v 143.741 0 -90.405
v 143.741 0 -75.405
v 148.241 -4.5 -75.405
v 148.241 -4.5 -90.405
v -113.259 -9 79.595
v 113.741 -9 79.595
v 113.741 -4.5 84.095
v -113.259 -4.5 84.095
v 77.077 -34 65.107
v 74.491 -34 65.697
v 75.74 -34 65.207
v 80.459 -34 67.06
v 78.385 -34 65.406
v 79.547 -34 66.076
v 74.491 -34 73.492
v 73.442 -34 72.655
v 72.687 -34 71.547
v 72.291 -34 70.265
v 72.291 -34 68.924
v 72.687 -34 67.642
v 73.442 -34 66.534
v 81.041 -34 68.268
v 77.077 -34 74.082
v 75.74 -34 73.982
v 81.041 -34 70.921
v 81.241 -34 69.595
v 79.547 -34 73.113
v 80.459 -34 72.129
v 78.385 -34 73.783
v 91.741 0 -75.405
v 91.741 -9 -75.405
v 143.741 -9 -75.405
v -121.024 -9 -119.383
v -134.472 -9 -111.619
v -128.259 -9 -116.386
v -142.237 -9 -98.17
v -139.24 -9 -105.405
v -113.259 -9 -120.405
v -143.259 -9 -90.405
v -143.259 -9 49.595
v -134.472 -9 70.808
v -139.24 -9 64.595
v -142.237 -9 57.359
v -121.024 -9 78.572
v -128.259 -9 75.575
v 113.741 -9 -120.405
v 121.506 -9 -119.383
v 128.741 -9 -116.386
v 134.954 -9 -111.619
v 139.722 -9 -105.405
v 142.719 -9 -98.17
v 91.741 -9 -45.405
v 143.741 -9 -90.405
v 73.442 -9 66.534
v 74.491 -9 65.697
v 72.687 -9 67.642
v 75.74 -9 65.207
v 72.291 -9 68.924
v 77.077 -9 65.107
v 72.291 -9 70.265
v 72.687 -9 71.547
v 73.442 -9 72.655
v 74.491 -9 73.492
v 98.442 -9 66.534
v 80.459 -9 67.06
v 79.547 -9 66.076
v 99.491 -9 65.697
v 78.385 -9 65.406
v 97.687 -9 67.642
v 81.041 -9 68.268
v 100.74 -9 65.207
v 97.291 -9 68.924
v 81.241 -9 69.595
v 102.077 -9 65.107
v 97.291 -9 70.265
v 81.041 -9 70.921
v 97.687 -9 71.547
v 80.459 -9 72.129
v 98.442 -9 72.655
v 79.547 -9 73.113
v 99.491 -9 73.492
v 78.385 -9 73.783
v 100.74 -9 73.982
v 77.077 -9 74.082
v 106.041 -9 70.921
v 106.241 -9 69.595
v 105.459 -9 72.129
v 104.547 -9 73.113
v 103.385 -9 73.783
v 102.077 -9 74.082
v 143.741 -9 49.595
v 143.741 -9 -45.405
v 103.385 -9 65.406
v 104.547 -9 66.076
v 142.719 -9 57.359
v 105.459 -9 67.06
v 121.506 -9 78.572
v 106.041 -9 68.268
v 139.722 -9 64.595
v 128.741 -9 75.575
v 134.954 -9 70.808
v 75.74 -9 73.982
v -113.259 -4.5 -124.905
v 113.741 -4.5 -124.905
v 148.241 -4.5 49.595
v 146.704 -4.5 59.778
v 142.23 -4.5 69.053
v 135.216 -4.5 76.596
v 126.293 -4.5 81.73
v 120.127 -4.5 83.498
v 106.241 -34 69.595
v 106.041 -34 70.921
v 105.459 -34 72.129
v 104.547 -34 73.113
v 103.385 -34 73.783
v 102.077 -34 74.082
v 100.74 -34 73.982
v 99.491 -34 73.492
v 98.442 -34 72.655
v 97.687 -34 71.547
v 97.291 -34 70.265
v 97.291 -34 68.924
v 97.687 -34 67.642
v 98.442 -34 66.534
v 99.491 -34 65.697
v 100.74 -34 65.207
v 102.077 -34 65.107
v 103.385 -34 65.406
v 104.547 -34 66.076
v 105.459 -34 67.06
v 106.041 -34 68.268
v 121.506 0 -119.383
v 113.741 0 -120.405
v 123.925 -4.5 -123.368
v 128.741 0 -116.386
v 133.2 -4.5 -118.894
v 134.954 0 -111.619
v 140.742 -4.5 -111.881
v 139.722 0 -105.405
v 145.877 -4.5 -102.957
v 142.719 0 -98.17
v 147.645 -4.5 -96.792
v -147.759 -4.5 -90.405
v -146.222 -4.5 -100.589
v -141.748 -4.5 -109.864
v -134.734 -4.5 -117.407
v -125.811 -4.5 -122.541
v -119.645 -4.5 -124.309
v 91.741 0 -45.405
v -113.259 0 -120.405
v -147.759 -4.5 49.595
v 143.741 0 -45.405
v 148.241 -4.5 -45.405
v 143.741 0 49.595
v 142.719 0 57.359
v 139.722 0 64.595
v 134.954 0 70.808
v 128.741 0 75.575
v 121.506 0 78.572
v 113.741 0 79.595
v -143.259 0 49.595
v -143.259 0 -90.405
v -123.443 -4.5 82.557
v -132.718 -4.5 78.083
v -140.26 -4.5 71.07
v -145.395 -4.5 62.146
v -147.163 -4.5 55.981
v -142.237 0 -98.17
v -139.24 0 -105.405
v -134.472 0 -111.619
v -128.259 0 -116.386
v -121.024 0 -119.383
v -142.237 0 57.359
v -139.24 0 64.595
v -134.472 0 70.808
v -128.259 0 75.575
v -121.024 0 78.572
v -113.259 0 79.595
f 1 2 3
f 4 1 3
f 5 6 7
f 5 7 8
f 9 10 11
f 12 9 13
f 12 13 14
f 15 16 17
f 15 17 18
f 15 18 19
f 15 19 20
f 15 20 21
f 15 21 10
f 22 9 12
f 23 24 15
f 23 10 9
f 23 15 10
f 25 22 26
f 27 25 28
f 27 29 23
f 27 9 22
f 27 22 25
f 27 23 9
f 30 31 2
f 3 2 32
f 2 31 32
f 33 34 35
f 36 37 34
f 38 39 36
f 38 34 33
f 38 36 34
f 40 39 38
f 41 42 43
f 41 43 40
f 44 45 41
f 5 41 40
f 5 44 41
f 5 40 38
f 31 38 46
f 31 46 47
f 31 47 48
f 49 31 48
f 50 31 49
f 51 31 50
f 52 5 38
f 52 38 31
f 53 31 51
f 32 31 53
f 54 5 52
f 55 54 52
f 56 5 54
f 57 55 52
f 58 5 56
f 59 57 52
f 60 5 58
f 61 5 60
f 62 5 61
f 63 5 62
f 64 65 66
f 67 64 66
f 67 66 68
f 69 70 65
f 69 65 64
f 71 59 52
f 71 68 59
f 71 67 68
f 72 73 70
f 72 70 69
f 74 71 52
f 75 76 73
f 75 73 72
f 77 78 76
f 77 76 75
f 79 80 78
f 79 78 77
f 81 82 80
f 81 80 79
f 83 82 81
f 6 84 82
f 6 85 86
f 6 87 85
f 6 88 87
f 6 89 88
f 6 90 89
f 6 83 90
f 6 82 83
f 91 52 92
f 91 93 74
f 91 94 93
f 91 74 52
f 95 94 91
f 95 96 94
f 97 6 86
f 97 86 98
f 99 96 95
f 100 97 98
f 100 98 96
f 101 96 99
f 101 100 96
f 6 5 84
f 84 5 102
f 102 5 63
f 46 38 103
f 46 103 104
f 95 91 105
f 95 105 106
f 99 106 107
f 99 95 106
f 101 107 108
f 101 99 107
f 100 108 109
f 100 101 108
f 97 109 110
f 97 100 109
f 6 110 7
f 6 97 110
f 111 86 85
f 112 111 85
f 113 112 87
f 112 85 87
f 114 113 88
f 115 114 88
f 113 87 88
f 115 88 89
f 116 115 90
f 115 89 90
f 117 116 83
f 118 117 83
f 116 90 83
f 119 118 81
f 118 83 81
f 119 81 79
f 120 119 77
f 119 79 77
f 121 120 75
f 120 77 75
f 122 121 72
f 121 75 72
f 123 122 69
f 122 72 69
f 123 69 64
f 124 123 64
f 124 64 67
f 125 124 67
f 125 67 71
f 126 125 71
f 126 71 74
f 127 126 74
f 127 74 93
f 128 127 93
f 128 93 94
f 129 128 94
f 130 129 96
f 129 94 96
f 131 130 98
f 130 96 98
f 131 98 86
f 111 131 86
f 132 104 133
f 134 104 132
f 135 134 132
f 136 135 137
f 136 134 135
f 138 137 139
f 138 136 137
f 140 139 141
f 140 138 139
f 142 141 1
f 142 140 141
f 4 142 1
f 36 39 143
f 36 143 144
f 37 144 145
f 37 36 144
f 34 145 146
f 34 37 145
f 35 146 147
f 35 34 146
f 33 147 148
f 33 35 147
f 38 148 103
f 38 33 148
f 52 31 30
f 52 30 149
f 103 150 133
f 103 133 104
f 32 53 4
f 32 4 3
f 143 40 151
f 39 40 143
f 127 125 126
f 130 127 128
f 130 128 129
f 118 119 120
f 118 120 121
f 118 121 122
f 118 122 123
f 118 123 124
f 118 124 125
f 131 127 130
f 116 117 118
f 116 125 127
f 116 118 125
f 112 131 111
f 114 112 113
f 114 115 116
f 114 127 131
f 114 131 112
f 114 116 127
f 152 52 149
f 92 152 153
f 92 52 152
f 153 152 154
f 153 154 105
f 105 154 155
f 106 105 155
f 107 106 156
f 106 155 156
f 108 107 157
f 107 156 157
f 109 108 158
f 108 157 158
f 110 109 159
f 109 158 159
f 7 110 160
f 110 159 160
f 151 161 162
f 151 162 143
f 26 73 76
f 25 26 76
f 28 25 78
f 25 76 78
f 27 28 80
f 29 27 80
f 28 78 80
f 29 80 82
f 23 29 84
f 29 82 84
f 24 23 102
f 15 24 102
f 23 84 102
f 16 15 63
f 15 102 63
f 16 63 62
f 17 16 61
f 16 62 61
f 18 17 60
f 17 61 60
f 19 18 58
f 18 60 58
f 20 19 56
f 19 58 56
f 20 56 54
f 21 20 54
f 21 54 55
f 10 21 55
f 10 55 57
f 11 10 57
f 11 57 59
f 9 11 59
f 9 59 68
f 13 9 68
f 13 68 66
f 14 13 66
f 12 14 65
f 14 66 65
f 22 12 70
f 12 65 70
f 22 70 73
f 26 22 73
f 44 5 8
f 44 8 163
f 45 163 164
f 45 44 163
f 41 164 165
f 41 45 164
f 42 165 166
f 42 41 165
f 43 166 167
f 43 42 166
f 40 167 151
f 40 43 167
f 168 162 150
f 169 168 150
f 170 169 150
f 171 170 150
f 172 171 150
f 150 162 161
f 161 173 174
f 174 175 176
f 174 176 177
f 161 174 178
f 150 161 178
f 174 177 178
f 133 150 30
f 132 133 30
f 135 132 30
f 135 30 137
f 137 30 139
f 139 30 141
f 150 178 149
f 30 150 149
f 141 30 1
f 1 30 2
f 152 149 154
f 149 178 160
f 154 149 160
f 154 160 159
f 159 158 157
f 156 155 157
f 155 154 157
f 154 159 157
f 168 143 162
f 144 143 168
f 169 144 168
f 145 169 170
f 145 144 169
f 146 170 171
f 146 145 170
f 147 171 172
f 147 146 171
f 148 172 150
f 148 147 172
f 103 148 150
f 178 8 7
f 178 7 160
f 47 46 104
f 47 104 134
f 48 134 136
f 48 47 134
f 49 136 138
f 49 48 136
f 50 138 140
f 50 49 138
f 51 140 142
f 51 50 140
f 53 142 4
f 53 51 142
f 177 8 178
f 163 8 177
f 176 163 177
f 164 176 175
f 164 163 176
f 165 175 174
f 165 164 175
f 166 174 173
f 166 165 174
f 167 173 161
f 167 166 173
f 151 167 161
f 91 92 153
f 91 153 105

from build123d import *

# Parameters (mm, degrees)
F1_DEPTH     = 9
F2_R         = 4.5
F3_DEPTH     = 25
F4_W         = 57
F4_H         = 30
F5_DEPTH     = 25
F6_SIZE      = 5
F7_T1_DEPTH  = 227
F7_T3_DEPTH  = 107.8584149398
F7_T5_DEPTH  = 27.8584149398
F7_T7_DEPTH  = 140
F7_T10_ANGLE = 90
F7_T12_ANGLE = 90
F7_T14_ANGLE = 90
F7_T16_ANGLE = 90


# Not quite as in the source:
# - a fillet or chamfer that OpenCascade refuses, or shapes differently, is made with other operations: its cross-section is extruded or revolved along the edge and cut away or added


with BuildPart() as f1:
    # F0 (on Front) → F1 (new body)
    with BuildSketch(Plane.XZ):
        with BuildLine():
            Line((113.7409908921, 84.5945477496), (-113.2590091079, 84.5945477496))
            ThreePointArc((-113.2590091079, 84.5945477496), (-138.0077464495, 74.3432850912), (-148.2590091079, 49.5945477496))
            Line((-148.2590091079, 49.5945477496), (-148.2590091079, -90.4054522504))
            ThreePointArc((-148.2590091079, -90.4054522504), (-138.0077464495, -115.1541895919), (-113.2590091079, -125.4054522504))
            Line((-113.2590091079, -125.4054522504), (113.7409908921, -125.4054522504))
            ThreePointArc((113.7409908921, -125.4054522504), (138.4897282336, -115.1541895919), (148.7409908921, -90.4054522504))
            Line((148.7409908921, -90.4054522504), (148.7409908921, 49.5945477496))
            ThreePointArc((148.7409908921, 49.5945477496), (138.4897282336, 74.3432850912), (113.7409908921, 84.5945477496))
        make_face()
    extrude(amount=F1_DEPTH)

    # F2 (on face) → F3 (join)
    with BuildSketch(Plane.XZ.offset(9)):
        with Locations((101.7409908921, 69.5945477496)):
            Circle(F2_R)
        with Locations((76.7409908921, 69.5945477496)):
            Circle(F2_R)
    extrude(amount=F3_DEPTH)

    # F4 (on face) → F5 (cut)
    with BuildSketch(Plane.XZ.offset(9)):
        with Locations((120.2409908921, -60.4054522504)):
            Rectangle(F4_W, F4_H)
    extrude(amount=-F5_DEPTH, mode=Mode.SUBTRACT)

    # F6
    f6_edges = [f1.edges().sort_by_distance(p)[0] for p in [
        (0.240991, -9, 84.594548),
    ]]
    chamfer(f6_edges, length=F6_SIZE)

    # F7: chamfer of 5 on 9 edges, made by hand

    # F7_s2 → F7_t1 (cut)
    with BuildSketch(Plane.YZ.offset(-113.2590091079)):
        with BuildLine():
            Line((-5.1414213562, 84.7359691059), (0.1414213562, 79.4531263934))
            Line((0.1414213562, 79.4531263934), (0.2414213562, 79.4531263934))
            ThreePointArc((0.2414213562, 79.4531263934), (0.1, 82.0238370715), (0.1, 84.5945477496))
            Line((0.1, 84.5945477496), (0, 84.6945477496))
            ThreePointArc((0, 84.6945477496), (-2.5707106781, 84.6945477496), (-5.1414213562, 84.8359691059))
            Line((-5.1414213562, 84.8359691059), (-5.1414213562, 84.7359691059))
        make_face()
        with BuildLine():
            Line((0.1414213562, -120.2640308941), (-5.1414213562, -125.5468736066))
            Line((-5.1414213562, -125.5468736066), (-5.1414213562, -125.6468736066))
            ThreePointArc((-5.1414213562, -125.6468736066), (-2.5707106781, -125.5054522504), (0, -125.5054522504))
            Line((0, -125.5054522504), (0.1, -125.4054522504))
            ThreePointArc((0.1, -125.4054522504), (0.1, -122.8347415723), (0.2414213562, -120.2640308941))
            Line((0.2414213562, -120.2640308941), (0.1414213562, -120.2640308941))
        make_face()
    extrude(amount=F7_T1_DEPTH, mode=Mode.SUBTRACT)

    # F7_s4 → F7_t3 (cut)
    with BuildSketch(Plane.XY.offset(-58.2638671902)):
        with BuildLine():
            Line((143.5995695358, 0.1414213562), (148.8824122483, -5.1414213562))
            Line((148.8824122483, -5.1414213562), (148.9824122483, -5.1414213562))
            ThreePointArc((148.9824122483, -5.1414213562), (148.8409908921, -2.5707106781), (148.8409908921, 0))
            Line((148.8409908921, 0), (148.7409908921, 0.1))
            ThreePointArc((148.7409908921, 0.1), (146.1702802139, 0.1), (143.5995695358, 0.2414213562))
            Line((143.5995695358, 0.2414213562), (143.5995695358, 0.1414213562))
        make_face()
    extrude(amount=F7_T3_DEPTH, mode=Mode.SUBTRACT)

    # F7_s6 → F7_t5 (cut)
    with BuildSketch(Plane.XY.offset(-90.4054522504)):
        with BuildLine():
            Line((143.5995695358, 0.1414213562), (148.8824122483, -5.1414213562))
            Line((148.8824122483, -5.1414213562), (148.9824122483, -5.1414213562))
            ThreePointArc((148.9824122483, -5.1414213562), (148.8409908921, -2.5707106781), (148.8409908921, 0))
            Line((148.8409908921, 0), (148.7409908921, 0.1))
            ThreePointArc((148.7409908921, 0.1), (146.1702802139, 0.1), (143.5995695358, 0.2414213562))
            Line((143.5995695358, 0.2414213562), (143.5995695358, 0.1414213562))
        make_face()
    extrude(amount=F7_T5_DEPTH, mode=Mode.SUBTRACT)

    # F7_s8 → F7_t7 (cut)
    with BuildSketch(Plane.XY.offset(-90.4054522504)):
        with BuildLine():
            Line((-143.1175877517, 0.1414213562), (-148.4004304642, -5.1414213562))
            Line((-148.4004304642, -5.1414213562), (-148.5004304642, -5.1414213562))
            ThreePointArc((-148.5004304642, -5.1414213562), (-148.3590091079, -2.5707106781), (-148.3590091079, 0))
            Line((-148.3590091079, 0), (-148.2590091079, 0.1))
            ThreePointArc((-148.2590091079, 0.1), (-145.6882984298, 0.1), (-143.1175877517, 0.2414213562))
            Line((-143.1175877517, 0.2414213562), (-143.1175877517, 0.1414213562))
        make_face()
    extrude(amount=F7_T7_DEPTH, mode=Mode.SUBTRACT)

    # F7_s9 → F7_t10 (revolve, cut)
    with BuildSketch(Plane.XY.offset(49.5945477496)):
        with BuildLine():
            Line((148.8824122483, -5.1414213562), (143.5995695358, 0.1414213562))
            Line((143.5995695358, 0.1414213562), (143.5995695358, 0.2414213562))
            ThreePointArc((143.5995695358, 0.2414213562), (146.1702802139, 0.1), (148.7409908921, 0.1))
            Line((148.7409908921, 0.1), (148.8409908921, 0))
            ThreePointArc((148.8409908921, 0), (148.8409908921, -2.5707106781), (148.9824122483, -5.1414213562))
            Line((148.9824122483, -5.1414213562), (148.8824122483, -5.1414213562))
        make_face()
    revolve(axis=Axis((113.7409908921, 0, 49.5945477496), (0, -1, 0)), revolution_arc=F7_T10_ANGLE, mode=Mode.SUBTRACT)

    # F7_s11 → F7_t12 (revolve, cut)
    with BuildSketch(Plane.YZ.offset(113.7409908921)):
        with BuildLine():
            Line((0.1414213562, -120.2640308941), (-5.1414213562, -125.5468736066))
            Line((-5.1414213562, -125.5468736066), (-5.1414213562, -125.6468736066))
            ThreePointArc((-5.1414213562, -125.6468736066), (-2.5707106781, -125.5054522504), (0, -125.5054522504))
            Line((0, -125.5054522504), (0.1, -125.4054522504))
            ThreePointArc((0.1, -125.4054522504), (0.1, -122.8347415723), (0.2414213562, -120.2640308941))
            Line((0.2414213562, -120.2640308941), (0.1414213562, -120.2640308941))
        make_face()
    revolve(axis=Axis((113.7409908921, 0, -90.4054522504), (0, -1, 0)), revolution_arc=F7_T12_ANGLE, mode=Mode.SUBTRACT)

    # F7_s13 → F7_t14 (revolve, cut)
    with BuildSketch(Plane.XY.offset(-90.4054522504)):
        with BuildLine():
            Line((-143.1175877517, 0.1414213562), (-148.4004304642, -5.1414213562))
            Line((-148.4004304642, -5.1414213562), (-148.5004304642, -5.1414213562))
            ThreePointArc((-148.5004304642, -5.1414213562), (-148.3590091079, -2.5707106781), (-148.3590091079, 0))
            Line((-148.3590091079, 0), (-148.2590091079, 0.1))
            ThreePointArc((-148.2590091079, 0.1), (-145.6882984298, 0.1), (-143.1175877517, 0.2414213562))
            Line((-143.1175877517, 0.2414213562), (-143.1175877517, 0.1414213562))
        make_face()
    revolve(axis=Axis((-113.2590091079, 0, -90.4054522504), (0, -1, 0)), revolution_arc=F7_T14_ANGLE, mode=Mode.SUBTRACT)

    # F7_s15 → F7_t16 (revolve, cut)
    with BuildSketch(Plane.YZ.offset(-113.2590091079)):
        with BuildLine():
            Line((0.1414213562, 79.4531263934), (-5.1414213562, 84.7359691059))
            Line((-5.1414213562, 84.7359691059), (-5.1414213562, 84.8359691059))
            ThreePointArc((-5.1414213562, 84.8359691059), (-2.5707106781, 84.6945477496), (0, 84.6945477496))
            Line((0, 84.6945477496), (0.1, 84.5945477496))
            ThreePointArc((0.1, 84.5945477496), (0.1, 82.0238370715), (0.2414213562, 79.4531263934))
            Line((0.2414213562, 79.4531263934), (0.1414213562, 79.4531263934))
        make_face()
    revolve(axis=Axis((-113.2590091079, 0, 49.5945477496), (0, -1, 0)), revolution_arc=F7_T16_ANGLE, mode=Mode.SUBTRACT)


solid = f1.part
